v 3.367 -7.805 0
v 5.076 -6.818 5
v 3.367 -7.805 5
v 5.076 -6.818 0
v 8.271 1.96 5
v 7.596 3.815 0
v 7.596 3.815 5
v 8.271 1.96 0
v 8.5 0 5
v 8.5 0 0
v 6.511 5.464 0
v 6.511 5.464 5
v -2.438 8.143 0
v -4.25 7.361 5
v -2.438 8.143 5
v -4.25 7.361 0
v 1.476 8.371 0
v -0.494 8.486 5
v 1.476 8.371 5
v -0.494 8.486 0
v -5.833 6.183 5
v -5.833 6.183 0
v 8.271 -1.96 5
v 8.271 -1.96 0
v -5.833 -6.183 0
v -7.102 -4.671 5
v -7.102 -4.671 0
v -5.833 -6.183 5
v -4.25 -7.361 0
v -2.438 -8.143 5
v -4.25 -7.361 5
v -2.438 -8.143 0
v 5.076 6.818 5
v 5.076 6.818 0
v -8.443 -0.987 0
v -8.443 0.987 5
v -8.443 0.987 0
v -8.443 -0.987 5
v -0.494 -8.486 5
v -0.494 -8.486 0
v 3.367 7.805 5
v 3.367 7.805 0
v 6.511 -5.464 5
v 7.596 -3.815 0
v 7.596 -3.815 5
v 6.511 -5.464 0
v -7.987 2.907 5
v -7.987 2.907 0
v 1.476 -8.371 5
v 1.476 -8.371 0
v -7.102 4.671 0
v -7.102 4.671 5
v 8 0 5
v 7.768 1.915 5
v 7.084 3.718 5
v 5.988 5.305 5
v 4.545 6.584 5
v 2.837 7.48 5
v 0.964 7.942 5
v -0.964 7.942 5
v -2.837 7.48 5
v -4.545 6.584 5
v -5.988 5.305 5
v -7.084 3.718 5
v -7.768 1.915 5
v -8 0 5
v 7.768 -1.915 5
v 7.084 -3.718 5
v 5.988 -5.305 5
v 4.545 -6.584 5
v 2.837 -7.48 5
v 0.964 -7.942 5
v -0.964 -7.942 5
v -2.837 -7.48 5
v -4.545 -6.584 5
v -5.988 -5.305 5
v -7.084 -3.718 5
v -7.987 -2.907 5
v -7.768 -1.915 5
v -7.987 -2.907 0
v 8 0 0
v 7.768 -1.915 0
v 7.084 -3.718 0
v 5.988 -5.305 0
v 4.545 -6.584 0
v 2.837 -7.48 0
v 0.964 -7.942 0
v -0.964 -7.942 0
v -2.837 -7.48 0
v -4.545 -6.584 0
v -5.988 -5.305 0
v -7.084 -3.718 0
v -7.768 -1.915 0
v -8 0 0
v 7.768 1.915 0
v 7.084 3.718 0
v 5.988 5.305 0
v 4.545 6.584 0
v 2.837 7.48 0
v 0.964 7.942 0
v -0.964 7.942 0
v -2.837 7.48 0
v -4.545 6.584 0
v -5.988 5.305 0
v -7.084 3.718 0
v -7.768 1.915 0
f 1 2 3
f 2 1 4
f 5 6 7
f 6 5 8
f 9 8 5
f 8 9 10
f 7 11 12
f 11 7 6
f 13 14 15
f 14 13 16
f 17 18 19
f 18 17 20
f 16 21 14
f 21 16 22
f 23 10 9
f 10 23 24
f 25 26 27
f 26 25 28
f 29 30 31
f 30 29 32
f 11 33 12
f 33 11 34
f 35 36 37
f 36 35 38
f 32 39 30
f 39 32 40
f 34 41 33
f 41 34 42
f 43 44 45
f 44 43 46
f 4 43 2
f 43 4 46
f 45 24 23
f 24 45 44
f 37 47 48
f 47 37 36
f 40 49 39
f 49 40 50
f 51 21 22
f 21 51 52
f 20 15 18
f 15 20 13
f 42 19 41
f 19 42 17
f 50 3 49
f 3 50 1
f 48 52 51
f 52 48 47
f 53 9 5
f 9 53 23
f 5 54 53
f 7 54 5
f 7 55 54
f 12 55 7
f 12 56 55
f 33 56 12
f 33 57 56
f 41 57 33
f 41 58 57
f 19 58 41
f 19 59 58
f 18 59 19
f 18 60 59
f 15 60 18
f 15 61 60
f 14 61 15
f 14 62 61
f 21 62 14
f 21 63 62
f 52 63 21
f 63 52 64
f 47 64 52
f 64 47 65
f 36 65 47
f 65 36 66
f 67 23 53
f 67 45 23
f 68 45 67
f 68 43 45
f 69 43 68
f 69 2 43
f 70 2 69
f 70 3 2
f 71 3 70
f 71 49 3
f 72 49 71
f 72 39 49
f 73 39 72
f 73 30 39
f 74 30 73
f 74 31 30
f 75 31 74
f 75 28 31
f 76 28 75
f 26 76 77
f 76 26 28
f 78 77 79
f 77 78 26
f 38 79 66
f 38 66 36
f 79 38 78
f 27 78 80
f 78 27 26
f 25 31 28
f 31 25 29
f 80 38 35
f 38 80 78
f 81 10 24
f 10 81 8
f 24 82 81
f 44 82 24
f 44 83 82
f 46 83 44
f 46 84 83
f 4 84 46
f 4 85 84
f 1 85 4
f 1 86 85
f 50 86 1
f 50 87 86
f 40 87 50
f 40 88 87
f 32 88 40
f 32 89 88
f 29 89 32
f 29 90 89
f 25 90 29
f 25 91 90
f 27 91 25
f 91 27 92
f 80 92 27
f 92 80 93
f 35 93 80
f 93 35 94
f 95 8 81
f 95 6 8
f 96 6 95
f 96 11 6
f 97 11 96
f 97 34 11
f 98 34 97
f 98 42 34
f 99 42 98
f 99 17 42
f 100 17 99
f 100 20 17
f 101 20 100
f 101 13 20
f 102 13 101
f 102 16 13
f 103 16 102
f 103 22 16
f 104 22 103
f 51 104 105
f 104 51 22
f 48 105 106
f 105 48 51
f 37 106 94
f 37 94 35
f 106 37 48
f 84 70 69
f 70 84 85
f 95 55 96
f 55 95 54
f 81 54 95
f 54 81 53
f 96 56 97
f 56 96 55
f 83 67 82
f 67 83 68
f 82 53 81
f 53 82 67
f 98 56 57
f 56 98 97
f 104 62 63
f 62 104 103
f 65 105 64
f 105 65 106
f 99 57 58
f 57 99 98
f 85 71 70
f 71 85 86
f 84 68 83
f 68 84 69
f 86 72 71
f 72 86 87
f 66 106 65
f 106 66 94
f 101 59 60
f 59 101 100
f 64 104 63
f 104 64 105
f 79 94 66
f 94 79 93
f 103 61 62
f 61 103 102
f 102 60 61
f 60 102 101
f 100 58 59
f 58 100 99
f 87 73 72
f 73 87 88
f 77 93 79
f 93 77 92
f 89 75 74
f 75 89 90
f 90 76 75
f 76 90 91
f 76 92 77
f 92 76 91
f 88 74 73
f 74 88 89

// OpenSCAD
//Connector tube

skittleHoleD = 17;

difference(){
    
    cylinder(d=17,h=5);
    translate([0,0,-1])cylinder(d=16,h=7);
    
}
